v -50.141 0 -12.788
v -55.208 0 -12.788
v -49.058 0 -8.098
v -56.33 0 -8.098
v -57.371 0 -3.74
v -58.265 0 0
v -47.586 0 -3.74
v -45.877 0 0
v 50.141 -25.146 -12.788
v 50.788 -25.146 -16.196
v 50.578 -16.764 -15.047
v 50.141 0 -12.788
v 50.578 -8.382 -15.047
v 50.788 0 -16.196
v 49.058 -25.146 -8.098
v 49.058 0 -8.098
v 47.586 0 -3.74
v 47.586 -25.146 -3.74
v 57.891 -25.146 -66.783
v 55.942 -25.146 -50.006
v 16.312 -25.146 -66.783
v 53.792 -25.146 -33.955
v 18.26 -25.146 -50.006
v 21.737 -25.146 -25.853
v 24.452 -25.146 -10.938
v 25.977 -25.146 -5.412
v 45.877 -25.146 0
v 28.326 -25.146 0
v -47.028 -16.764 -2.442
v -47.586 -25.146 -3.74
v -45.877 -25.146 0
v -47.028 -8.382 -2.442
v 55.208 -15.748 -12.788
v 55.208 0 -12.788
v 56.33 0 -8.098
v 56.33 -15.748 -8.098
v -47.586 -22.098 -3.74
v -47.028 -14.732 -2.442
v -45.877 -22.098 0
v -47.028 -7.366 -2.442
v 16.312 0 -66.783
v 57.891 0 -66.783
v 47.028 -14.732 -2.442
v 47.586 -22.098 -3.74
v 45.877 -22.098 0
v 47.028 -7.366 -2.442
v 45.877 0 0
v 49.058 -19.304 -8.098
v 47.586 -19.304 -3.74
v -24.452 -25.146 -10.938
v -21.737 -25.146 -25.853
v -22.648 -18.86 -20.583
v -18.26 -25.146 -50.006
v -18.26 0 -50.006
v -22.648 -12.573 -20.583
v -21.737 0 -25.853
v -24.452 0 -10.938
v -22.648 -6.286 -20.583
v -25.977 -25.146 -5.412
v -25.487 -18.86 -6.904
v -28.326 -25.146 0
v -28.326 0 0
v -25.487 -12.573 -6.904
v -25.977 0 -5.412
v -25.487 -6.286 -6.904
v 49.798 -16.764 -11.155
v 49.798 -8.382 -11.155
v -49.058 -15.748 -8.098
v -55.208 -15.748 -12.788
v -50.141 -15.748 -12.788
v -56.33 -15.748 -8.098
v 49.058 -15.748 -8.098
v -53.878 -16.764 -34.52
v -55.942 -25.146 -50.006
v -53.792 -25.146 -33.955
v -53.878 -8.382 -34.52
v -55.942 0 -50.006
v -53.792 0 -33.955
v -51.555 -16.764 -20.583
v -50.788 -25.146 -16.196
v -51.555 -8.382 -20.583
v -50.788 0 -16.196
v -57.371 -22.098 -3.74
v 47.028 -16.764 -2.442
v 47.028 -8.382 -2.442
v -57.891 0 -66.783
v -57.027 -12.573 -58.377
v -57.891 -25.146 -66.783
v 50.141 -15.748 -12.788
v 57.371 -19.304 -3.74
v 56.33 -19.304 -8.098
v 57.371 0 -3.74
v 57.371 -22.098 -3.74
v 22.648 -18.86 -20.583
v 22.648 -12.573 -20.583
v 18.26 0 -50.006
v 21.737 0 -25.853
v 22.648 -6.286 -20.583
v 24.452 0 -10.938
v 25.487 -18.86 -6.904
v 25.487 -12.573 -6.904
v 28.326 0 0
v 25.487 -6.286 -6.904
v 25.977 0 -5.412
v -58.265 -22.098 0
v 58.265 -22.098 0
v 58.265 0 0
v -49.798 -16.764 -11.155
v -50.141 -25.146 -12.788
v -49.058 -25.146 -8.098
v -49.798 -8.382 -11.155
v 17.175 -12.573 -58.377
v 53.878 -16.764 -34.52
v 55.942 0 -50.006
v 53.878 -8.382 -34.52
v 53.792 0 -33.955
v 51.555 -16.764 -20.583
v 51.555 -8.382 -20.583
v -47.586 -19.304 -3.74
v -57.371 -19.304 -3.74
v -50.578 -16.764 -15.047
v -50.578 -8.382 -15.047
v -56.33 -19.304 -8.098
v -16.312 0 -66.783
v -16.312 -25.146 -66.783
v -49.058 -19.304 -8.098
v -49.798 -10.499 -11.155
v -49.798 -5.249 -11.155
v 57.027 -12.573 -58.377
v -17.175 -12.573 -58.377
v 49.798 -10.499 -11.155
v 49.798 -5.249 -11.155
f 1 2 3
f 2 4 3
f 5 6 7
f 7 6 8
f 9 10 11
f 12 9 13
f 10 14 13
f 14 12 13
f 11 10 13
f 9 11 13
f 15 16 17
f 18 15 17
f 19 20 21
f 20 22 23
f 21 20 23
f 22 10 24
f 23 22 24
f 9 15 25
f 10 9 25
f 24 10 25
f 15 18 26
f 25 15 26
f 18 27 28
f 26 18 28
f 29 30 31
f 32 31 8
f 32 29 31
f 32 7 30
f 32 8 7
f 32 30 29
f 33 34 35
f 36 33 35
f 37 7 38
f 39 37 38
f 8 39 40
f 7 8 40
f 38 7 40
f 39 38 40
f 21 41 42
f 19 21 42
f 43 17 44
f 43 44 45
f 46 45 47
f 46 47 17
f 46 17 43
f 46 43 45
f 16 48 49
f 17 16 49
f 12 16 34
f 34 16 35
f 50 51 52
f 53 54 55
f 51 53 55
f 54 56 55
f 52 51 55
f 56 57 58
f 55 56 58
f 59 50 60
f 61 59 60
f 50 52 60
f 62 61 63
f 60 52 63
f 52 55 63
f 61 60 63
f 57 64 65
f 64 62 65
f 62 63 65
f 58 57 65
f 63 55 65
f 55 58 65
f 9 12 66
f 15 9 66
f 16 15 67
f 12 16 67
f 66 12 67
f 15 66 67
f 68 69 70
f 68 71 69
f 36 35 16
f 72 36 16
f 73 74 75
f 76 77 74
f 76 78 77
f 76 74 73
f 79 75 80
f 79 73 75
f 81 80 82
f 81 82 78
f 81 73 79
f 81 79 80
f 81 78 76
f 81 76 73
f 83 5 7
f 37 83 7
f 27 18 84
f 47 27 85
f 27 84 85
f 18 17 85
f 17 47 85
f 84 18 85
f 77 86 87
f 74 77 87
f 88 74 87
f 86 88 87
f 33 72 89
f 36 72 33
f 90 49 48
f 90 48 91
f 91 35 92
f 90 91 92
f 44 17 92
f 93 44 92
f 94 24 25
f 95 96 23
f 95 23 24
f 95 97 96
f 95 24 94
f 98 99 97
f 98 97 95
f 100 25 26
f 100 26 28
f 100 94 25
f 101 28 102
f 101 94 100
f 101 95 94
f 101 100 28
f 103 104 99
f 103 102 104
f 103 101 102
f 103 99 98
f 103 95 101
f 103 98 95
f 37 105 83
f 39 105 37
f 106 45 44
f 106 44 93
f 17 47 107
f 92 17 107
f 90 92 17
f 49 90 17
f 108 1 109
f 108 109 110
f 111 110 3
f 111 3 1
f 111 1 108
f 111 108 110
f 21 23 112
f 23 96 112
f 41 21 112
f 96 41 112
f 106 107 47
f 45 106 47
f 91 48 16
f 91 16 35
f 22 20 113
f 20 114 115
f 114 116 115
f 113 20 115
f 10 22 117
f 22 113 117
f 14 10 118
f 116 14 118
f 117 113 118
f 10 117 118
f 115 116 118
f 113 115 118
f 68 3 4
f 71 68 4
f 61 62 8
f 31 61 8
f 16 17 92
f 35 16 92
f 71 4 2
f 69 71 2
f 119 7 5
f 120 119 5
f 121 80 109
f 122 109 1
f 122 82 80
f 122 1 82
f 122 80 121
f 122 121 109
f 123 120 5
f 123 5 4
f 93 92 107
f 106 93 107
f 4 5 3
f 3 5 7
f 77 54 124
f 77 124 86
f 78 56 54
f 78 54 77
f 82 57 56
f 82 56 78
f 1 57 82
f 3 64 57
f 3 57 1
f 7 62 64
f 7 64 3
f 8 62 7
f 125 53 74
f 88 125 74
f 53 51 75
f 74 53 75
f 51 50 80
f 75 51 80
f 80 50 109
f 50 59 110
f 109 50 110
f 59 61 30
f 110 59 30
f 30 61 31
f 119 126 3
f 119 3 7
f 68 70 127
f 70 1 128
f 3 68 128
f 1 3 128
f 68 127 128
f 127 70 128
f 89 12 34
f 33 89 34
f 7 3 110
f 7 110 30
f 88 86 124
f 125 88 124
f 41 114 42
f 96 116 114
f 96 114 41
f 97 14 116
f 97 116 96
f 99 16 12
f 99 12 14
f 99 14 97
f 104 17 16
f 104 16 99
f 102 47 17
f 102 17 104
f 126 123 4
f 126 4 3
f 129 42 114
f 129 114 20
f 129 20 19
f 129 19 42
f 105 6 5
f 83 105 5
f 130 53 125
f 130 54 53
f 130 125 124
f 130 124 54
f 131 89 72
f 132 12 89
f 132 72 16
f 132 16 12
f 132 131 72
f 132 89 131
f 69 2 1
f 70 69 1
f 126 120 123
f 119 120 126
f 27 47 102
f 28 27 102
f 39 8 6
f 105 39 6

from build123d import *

# Parameters (mm, degrees)
F1_DEPTH = 25.146
F2_DEPTH = 22.098
F3_DEPTH = 19.304
F4_DEPTH = 15.748


# Not quite as in the source:
# - a feature names something its author has since deleted; it is built from what else it names


with BuildPart() as f1:
    # F0 (on Front) → F1 (new body)
    with BuildSketch(Plane.XZ):
        with BuildLine():
            add(Edge.make_bspline(
                [(18.2603467256, -50.0062517822), (18.9200009821, -44.7411017766), (20.2069897283, -34.4687678414), (22.6027171981, -20.9673750462), (24.964728506, -6.9558000416), (27.3280893956, -2.0652493334), (28.3261220902, 0)],
                knots=[0, 0, 0, 0, 0.2787145144, 0.5437734084, 0.8073383305, 1, 1, 1, 1], degree=3))
            add(Edge.make_bspline(
                [(18.2603467256, -50.0062517822), (17.8821318051, -52.7888494967), (17.1179839852, -58.354700738), (16.5830328982, -64.0164932483), (16.3121369904, -66.782541573)],
                knots=[0, 0, 0, 0, 0.4998751742, 1, 1, 1, 1], degree=3))
            Line((16.3121369904, -66.782541573), (37.1014112607, -66.782541573))
            Line((37.1014112607, -66.782541573), (57.890685531, -66.782541573))
            add(Edge.make_bspline(
                [(55.9424757957, -50.0062517822), (56.3206907163, -52.7888494967), (57.0848385361, -58.354700738), (57.6197896231, -64.0164932483), (57.890685531, -66.782541573)],
                knots=[0, 0, 0, 0, 0.4998751742, 1, 1, 1, 1], degree=3))
            add(Edge.make_bspline(
                [(55.9424757957, -50.0062517822), (55.2828215393, -44.7411017766), (53.995832793, -34.4687678414), (52.1449488151, -24.0379020943), (51.0519382112, -17.6595205046), (50.787943229, -16.1955729126)],
                knots=[0, 0, 0, 0, 0.2787145144, 0.5437734084, 0.6237310377, 0.6237310377, 0.6237310377, 0.6237310377], degree=3))
            add(Edge.make_bspline(
                [(50.787943229, -16.1955729126), (50.5801603578, -15.0433417924), (50.3657554699, -13.8999341074), (50.1413285617, -12.7882305847)],
                knots=[0.6237310377, 0.6237310377, 0.6237310377, 0.6237310377, 0.6866633921, 0.6866633921, 0.6866633921, 0.6866633921], degree=3))
            add(Edge.make_bspline(
                [(50.1413285617, -12.7882305847), (49.8063148795, -11.1287330959), (49.4489690484, -9.5398822483), (49.0579815986, -8.0977864563)],
                knots=[0.6866633921, 0.6866633921, 0.6866633921, 0.6866633921, 0.7806057805, 0.7806057805, 0.7806057805, 0.7806057805], degree=3))
            add(Edge.make_bspline(
                [(49.0579815986, -8.0977864563), (48.9467209446, -7.6874190111), (48.4886567249, -6.0860553408), (47.9823899415, -4.7049290916), (47.5862966388, -3.7397006431)],
                knots=[0.7806057805, 0.7806057805, 0.7806057805, 0.7806057805, 0.8073383305, 0.8880343317, 0.8880343317, 0.8880343317, 0.8880343317], degree=3))
            add(Edge.make_bspline(
                [(47.5862966388, -3.7397006431), (47.0367173451, -2.4004465697), (46.4567088881, -1.2002232848), (45.8767004311, 0)],
                knots=[0.8880343317, 0.8880343317, 0.8880343317, 0.8880343317, 1, 1, 1, 1], degree=3))
            Line((45.8767004311, 0), (28.3261220902, 0))
        make_face()
    extrude(amount=F1_DEPTH)


with BuildPart() as f1b:
    # F0 (on Front) → F1, piece 2 (new body)
    with BuildSketch(Plane.XZ):
        with BuildLine():
            add(Edge.make_bspline(
                [(-55.9424757957, -50.0062517822), (-55.2828215393, -44.7411017766), (-53.995832793, -34.4687678414), (-52.1449488151, -24.0379020943), (-51.0519382112, -17.6595205046), (-50.787943229, -16.1955729126)],
                knots=[0, 0, 0, 0, 0.2787145144, 0.5437734084, 0.6237310377, 0.6237310377, 0.6237310377, 0.6237310377], degree=3))
            add(Edge.make_bspline(
                [(-55.9424757957, -50.0062517822), (-56.3206907163, -52.7888494967), (-57.0848385361, -58.354700738), (-57.6197896231, -64.0164932483), (-57.890685531, -66.782541573)],
                knots=[0, 0, 0, 0, 0.4998751742, 1, 1, 1, 1], degree=3))
            Line((-57.890685531, -66.782541573), (-37.1014112607, -66.782541573))
            Line((-37.1014112607, -66.782541573), (-16.3121369904, -66.782541573))
            add(Edge.make_bspline(
                [(-18.2603467256, -50.0062517822), (-17.8821318051, -52.7888494967), (-17.1179839852, -58.354700738), (-16.5830328982, -64.0164932483), (-16.3121369904, -66.782541573)],
                knots=[0, 0, 0, 0, 0.4998751742, 1, 1, 1, 1], degree=3))
            add(Edge.make_bspline(
                [(-18.2603467256, -50.0062517822), (-18.9200009821, -44.7411017766), (-20.2069897283, -34.4687678414), (-22.6027171981, -20.9673750462), (-24.964728506, -6.9558000416), (-27.3280893956, -2.0652493334), (-28.3261220902, 0)],
                knots=[0, 0, 0, 0, 0.2787145144, 0.5437734084, 0.8073383305, 1, 1, 1, 1], degree=3))
            Line((-28.3261220902, 0), (-45.8767004311, 0))
            add(Edge.make_bspline(
                [(-47.5862966388, -3.7397006431), (-47.0367173451, -2.4004465697), (-46.4567088881, -1.2002232848), (-45.8767004311, 0)],
                knots=[0.8880343317, 0.8880343317, 0.8880343317, 0.8880343317, 1, 1, 1, 1], degree=3))
            add(Edge.make_bspline(
                [(-49.0579815986, -8.0977864563), (-48.9467209446, -7.6874190111), (-48.4886567249, -6.0860553408), (-47.9823899415, -4.7049290916), (-47.5862966388, -3.7397006431)],
                knots=[0.7806057805, 0.7806057805, 0.7806057805, 0.7806057805, 0.8073383305, 0.8880343317, 0.8880343317, 0.8880343317, 0.8880343317], degree=3))
            add(Edge.make_bspline(
                [(-50.1413285617, -12.7882305847), (-49.8063148795, -11.1287330959), (-49.4489690484, -9.5398822483), (-49.0579815986, -8.0977864563)],
                knots=[0.6866633921, 0.6866633921, 0.6866633921, 0.6866633921, 0.7806057805, 0.7806057805, 0.7806057805, 0.7806057805], degree=3))
            add(Edge.make_bspline(
                [(-50.787943229, -16.1955729126), (-50.5801603578, -15.0433417924), (-50.3657554699, -13.8999341074), (-50.1413285617, -12.7882305847)],
                knots=[0.6237310377, 0.6237310377, 0.6237310377, 0.6237310377, 0.6866633921, 0.6866633921, 0.6866633921, 0.6866633921], degree=3))
        make_face()
    extrude(amount=F1_DEPTH)


with BuildPart() as f2:
    # F0 (on Front) → F2 (new body)
    with BuildSketch(Plane.XZ):
        with BuildLine():
            Line((58.2653470337, 0), (45.8767004311, 0))
            add(Edge.make_bspline(
                [(47.5862966388, -3.7397006431), (47.0367173451, -2.4004465697), (46.4567088881, -1.2002232848), (45.8767004311, 0)],
                knots=[0.8880343317, 0.8880343317, 0.8880343317, 0.8880343317, 1, 1, 1, 1], degree=3))
            Line((47.5862966388, -3.7397006431), (57.3713946033, -3.7397006431))
            Line((57.3713946033, -3.7397006431), (58.2653470337, 0))
        make_face()
    extrude(amount=F2_DEPTH)


with BuildPart() as f2b:
    # F0 (on Front) → F2, piece 2 (new body)
    with BuildSketch(Plane.XZ):
        with BuildLine():
            Line((-57.3713946033, -3.7397006431), (-47.5862966388, -3.7397006431))
            add(Edge.make_bspline(
                [(-47.5862966388, -3.7397006431), (-47.0367173451, -2.4004465697), (-46.4567088881, -1.2002232848), (-45.8767004311, 0)],
                knots=[0.8880343317, 0.8880343317, 0.8880343317, 0.8880343317, 1, 1, 1, 1], degree=3))
            Line((-45.8767004311, 0), (-58.2653470337, 0))
            Line((-58.2653470337, 0), (-57.3713946033, -3.7397006431))
        make_face()
    extrude(amount=F2_DEPTH)


with BuildPart() as f3:
    # F0 (on Front) → F3 (new body)
    with BuildSketch(Plane.XZ):
        with BuildLine():
            Line((57.3713946033, -3.7397006431), (47.5862966388, -3.7397006431))
            add(Edge.make_bspline(
                [(49.0579815986, -8.0977864563), (48.9467209446, -7.6874190111), (48.4886567249, -6.0860553408), (47.9823899415, -4.7049290916), (47.5862966388, -3.7397006431)],
                knots=[0.7806057805, 0.7806057805, 0.7806057805, 0.7806057805, 0.8073383305, 0.8880343317, 0.8880343317, 0.8880343317, 0.8880343317], degree=3))
            Line((49.0579815986, -8.0977864563), (56.3296210025, -8.0977864563))
            Line((56.3296210025, -8.0977864563), (57.3713946033, -3.7397006431))
        make_face()
    extrude(amount=F3_DEPTH)


with BuildPart() as f3b:
    # F0 (on Front) → F3, piece 2 (new body)
    with BuildSketch(Plane.XZ):
        with BuildLine():
            Line((-56.3296210025, -8.0977864563), (-49.0579815986, -8.0977864563))
            add(Edge.make_bspline(
                [(-49.0579815986, -8.0977864563), (-48.9467209446, -7.6874190111), (-48.4886567249, -6.0860553408), (-47.9823899415, -4.7049290916), (-47.5862966388, -3.7397006431)],
                knots=[0.7806057805, 0.7806057805, 0.7806057805, 0.7806057805, 0.8073383305, 0.8880343317, 0.8880343317, 0.8880343317, 0.8880343317], degree=3))
            Line((-47.5862966388, -3.7397006431), (-57.3713946033, -3.7397006431))
            Line((-57.3713946033, -3.7397006431), (-56.3296210025, -8.0977864563))
        make_face()
    extrude(amount=F3_DEPTH)


with BuildPart() as f4:
    # F0 (on Front) → F4 (new body)
    with BuildSketch(Plane.XZ):
        with BuildLine():
            Line((-55.2083991912, -12.7882305847), (-50.1413285617, -12.7882305847))
            add(Edge.make_bspline(
                [(-50.1413285617, -12.7882305847), (-49.8063148795, -11.1287330959), (-49.4489690484, -9.5398822483), (-49.0579815986, -8.0977864563)],
                knots=[0.6866633921, 0.6866633921, 0.6866633921, 0.6866633921, 0.7806057805, 0.7806057805, 0.7806057805, 0.7806057805], degree=3))
            Line((-49.0579815986, -8.0977864563), (-56.3296210025, -8.0977864563))
            Line((-56.3296210025, -8.0977864563), (-55.2083991912, -12.7882305847))
        make_face()
    extrude(amount=F4_DEPTH)


with BuildPart() as f4b:
    # F0 (on Front) → F4, piece 2 (new body)
    with BuildSketch(Plane.XZ):
        with BuildLine():
            Line((56.3296210025, -8.0977864563), (49.0579815986, -8.0977864563))
            add(Edge.make_bspline(
                [(50.1413285617, -12.7882305847), (49.8063148795, -11.1287330959), (49.4489690484, -9.5398822483), (49.0579815986, -8.0977864563)],
                knots=[0.6866633921, 0.6866633921, 0.6866633921, 0.6866633921, 0.7806057805, 0.7806057805, 0.7806057805, 0.7806057805], degree=3))
            Line((50.1413285617, -12.7882305847), (55.2083991912, -12.7882305847))
            Line((55.2083991912, -12.7882305847), (56.3296210025, -8.0977864563))
        make_face()
    extrude(amount=F4_DEPTH)


solid = Compound([f1.part, f1b.part, f2.part, f2b.part, f3.part, f3b.part, f4.part, f4b.part])
